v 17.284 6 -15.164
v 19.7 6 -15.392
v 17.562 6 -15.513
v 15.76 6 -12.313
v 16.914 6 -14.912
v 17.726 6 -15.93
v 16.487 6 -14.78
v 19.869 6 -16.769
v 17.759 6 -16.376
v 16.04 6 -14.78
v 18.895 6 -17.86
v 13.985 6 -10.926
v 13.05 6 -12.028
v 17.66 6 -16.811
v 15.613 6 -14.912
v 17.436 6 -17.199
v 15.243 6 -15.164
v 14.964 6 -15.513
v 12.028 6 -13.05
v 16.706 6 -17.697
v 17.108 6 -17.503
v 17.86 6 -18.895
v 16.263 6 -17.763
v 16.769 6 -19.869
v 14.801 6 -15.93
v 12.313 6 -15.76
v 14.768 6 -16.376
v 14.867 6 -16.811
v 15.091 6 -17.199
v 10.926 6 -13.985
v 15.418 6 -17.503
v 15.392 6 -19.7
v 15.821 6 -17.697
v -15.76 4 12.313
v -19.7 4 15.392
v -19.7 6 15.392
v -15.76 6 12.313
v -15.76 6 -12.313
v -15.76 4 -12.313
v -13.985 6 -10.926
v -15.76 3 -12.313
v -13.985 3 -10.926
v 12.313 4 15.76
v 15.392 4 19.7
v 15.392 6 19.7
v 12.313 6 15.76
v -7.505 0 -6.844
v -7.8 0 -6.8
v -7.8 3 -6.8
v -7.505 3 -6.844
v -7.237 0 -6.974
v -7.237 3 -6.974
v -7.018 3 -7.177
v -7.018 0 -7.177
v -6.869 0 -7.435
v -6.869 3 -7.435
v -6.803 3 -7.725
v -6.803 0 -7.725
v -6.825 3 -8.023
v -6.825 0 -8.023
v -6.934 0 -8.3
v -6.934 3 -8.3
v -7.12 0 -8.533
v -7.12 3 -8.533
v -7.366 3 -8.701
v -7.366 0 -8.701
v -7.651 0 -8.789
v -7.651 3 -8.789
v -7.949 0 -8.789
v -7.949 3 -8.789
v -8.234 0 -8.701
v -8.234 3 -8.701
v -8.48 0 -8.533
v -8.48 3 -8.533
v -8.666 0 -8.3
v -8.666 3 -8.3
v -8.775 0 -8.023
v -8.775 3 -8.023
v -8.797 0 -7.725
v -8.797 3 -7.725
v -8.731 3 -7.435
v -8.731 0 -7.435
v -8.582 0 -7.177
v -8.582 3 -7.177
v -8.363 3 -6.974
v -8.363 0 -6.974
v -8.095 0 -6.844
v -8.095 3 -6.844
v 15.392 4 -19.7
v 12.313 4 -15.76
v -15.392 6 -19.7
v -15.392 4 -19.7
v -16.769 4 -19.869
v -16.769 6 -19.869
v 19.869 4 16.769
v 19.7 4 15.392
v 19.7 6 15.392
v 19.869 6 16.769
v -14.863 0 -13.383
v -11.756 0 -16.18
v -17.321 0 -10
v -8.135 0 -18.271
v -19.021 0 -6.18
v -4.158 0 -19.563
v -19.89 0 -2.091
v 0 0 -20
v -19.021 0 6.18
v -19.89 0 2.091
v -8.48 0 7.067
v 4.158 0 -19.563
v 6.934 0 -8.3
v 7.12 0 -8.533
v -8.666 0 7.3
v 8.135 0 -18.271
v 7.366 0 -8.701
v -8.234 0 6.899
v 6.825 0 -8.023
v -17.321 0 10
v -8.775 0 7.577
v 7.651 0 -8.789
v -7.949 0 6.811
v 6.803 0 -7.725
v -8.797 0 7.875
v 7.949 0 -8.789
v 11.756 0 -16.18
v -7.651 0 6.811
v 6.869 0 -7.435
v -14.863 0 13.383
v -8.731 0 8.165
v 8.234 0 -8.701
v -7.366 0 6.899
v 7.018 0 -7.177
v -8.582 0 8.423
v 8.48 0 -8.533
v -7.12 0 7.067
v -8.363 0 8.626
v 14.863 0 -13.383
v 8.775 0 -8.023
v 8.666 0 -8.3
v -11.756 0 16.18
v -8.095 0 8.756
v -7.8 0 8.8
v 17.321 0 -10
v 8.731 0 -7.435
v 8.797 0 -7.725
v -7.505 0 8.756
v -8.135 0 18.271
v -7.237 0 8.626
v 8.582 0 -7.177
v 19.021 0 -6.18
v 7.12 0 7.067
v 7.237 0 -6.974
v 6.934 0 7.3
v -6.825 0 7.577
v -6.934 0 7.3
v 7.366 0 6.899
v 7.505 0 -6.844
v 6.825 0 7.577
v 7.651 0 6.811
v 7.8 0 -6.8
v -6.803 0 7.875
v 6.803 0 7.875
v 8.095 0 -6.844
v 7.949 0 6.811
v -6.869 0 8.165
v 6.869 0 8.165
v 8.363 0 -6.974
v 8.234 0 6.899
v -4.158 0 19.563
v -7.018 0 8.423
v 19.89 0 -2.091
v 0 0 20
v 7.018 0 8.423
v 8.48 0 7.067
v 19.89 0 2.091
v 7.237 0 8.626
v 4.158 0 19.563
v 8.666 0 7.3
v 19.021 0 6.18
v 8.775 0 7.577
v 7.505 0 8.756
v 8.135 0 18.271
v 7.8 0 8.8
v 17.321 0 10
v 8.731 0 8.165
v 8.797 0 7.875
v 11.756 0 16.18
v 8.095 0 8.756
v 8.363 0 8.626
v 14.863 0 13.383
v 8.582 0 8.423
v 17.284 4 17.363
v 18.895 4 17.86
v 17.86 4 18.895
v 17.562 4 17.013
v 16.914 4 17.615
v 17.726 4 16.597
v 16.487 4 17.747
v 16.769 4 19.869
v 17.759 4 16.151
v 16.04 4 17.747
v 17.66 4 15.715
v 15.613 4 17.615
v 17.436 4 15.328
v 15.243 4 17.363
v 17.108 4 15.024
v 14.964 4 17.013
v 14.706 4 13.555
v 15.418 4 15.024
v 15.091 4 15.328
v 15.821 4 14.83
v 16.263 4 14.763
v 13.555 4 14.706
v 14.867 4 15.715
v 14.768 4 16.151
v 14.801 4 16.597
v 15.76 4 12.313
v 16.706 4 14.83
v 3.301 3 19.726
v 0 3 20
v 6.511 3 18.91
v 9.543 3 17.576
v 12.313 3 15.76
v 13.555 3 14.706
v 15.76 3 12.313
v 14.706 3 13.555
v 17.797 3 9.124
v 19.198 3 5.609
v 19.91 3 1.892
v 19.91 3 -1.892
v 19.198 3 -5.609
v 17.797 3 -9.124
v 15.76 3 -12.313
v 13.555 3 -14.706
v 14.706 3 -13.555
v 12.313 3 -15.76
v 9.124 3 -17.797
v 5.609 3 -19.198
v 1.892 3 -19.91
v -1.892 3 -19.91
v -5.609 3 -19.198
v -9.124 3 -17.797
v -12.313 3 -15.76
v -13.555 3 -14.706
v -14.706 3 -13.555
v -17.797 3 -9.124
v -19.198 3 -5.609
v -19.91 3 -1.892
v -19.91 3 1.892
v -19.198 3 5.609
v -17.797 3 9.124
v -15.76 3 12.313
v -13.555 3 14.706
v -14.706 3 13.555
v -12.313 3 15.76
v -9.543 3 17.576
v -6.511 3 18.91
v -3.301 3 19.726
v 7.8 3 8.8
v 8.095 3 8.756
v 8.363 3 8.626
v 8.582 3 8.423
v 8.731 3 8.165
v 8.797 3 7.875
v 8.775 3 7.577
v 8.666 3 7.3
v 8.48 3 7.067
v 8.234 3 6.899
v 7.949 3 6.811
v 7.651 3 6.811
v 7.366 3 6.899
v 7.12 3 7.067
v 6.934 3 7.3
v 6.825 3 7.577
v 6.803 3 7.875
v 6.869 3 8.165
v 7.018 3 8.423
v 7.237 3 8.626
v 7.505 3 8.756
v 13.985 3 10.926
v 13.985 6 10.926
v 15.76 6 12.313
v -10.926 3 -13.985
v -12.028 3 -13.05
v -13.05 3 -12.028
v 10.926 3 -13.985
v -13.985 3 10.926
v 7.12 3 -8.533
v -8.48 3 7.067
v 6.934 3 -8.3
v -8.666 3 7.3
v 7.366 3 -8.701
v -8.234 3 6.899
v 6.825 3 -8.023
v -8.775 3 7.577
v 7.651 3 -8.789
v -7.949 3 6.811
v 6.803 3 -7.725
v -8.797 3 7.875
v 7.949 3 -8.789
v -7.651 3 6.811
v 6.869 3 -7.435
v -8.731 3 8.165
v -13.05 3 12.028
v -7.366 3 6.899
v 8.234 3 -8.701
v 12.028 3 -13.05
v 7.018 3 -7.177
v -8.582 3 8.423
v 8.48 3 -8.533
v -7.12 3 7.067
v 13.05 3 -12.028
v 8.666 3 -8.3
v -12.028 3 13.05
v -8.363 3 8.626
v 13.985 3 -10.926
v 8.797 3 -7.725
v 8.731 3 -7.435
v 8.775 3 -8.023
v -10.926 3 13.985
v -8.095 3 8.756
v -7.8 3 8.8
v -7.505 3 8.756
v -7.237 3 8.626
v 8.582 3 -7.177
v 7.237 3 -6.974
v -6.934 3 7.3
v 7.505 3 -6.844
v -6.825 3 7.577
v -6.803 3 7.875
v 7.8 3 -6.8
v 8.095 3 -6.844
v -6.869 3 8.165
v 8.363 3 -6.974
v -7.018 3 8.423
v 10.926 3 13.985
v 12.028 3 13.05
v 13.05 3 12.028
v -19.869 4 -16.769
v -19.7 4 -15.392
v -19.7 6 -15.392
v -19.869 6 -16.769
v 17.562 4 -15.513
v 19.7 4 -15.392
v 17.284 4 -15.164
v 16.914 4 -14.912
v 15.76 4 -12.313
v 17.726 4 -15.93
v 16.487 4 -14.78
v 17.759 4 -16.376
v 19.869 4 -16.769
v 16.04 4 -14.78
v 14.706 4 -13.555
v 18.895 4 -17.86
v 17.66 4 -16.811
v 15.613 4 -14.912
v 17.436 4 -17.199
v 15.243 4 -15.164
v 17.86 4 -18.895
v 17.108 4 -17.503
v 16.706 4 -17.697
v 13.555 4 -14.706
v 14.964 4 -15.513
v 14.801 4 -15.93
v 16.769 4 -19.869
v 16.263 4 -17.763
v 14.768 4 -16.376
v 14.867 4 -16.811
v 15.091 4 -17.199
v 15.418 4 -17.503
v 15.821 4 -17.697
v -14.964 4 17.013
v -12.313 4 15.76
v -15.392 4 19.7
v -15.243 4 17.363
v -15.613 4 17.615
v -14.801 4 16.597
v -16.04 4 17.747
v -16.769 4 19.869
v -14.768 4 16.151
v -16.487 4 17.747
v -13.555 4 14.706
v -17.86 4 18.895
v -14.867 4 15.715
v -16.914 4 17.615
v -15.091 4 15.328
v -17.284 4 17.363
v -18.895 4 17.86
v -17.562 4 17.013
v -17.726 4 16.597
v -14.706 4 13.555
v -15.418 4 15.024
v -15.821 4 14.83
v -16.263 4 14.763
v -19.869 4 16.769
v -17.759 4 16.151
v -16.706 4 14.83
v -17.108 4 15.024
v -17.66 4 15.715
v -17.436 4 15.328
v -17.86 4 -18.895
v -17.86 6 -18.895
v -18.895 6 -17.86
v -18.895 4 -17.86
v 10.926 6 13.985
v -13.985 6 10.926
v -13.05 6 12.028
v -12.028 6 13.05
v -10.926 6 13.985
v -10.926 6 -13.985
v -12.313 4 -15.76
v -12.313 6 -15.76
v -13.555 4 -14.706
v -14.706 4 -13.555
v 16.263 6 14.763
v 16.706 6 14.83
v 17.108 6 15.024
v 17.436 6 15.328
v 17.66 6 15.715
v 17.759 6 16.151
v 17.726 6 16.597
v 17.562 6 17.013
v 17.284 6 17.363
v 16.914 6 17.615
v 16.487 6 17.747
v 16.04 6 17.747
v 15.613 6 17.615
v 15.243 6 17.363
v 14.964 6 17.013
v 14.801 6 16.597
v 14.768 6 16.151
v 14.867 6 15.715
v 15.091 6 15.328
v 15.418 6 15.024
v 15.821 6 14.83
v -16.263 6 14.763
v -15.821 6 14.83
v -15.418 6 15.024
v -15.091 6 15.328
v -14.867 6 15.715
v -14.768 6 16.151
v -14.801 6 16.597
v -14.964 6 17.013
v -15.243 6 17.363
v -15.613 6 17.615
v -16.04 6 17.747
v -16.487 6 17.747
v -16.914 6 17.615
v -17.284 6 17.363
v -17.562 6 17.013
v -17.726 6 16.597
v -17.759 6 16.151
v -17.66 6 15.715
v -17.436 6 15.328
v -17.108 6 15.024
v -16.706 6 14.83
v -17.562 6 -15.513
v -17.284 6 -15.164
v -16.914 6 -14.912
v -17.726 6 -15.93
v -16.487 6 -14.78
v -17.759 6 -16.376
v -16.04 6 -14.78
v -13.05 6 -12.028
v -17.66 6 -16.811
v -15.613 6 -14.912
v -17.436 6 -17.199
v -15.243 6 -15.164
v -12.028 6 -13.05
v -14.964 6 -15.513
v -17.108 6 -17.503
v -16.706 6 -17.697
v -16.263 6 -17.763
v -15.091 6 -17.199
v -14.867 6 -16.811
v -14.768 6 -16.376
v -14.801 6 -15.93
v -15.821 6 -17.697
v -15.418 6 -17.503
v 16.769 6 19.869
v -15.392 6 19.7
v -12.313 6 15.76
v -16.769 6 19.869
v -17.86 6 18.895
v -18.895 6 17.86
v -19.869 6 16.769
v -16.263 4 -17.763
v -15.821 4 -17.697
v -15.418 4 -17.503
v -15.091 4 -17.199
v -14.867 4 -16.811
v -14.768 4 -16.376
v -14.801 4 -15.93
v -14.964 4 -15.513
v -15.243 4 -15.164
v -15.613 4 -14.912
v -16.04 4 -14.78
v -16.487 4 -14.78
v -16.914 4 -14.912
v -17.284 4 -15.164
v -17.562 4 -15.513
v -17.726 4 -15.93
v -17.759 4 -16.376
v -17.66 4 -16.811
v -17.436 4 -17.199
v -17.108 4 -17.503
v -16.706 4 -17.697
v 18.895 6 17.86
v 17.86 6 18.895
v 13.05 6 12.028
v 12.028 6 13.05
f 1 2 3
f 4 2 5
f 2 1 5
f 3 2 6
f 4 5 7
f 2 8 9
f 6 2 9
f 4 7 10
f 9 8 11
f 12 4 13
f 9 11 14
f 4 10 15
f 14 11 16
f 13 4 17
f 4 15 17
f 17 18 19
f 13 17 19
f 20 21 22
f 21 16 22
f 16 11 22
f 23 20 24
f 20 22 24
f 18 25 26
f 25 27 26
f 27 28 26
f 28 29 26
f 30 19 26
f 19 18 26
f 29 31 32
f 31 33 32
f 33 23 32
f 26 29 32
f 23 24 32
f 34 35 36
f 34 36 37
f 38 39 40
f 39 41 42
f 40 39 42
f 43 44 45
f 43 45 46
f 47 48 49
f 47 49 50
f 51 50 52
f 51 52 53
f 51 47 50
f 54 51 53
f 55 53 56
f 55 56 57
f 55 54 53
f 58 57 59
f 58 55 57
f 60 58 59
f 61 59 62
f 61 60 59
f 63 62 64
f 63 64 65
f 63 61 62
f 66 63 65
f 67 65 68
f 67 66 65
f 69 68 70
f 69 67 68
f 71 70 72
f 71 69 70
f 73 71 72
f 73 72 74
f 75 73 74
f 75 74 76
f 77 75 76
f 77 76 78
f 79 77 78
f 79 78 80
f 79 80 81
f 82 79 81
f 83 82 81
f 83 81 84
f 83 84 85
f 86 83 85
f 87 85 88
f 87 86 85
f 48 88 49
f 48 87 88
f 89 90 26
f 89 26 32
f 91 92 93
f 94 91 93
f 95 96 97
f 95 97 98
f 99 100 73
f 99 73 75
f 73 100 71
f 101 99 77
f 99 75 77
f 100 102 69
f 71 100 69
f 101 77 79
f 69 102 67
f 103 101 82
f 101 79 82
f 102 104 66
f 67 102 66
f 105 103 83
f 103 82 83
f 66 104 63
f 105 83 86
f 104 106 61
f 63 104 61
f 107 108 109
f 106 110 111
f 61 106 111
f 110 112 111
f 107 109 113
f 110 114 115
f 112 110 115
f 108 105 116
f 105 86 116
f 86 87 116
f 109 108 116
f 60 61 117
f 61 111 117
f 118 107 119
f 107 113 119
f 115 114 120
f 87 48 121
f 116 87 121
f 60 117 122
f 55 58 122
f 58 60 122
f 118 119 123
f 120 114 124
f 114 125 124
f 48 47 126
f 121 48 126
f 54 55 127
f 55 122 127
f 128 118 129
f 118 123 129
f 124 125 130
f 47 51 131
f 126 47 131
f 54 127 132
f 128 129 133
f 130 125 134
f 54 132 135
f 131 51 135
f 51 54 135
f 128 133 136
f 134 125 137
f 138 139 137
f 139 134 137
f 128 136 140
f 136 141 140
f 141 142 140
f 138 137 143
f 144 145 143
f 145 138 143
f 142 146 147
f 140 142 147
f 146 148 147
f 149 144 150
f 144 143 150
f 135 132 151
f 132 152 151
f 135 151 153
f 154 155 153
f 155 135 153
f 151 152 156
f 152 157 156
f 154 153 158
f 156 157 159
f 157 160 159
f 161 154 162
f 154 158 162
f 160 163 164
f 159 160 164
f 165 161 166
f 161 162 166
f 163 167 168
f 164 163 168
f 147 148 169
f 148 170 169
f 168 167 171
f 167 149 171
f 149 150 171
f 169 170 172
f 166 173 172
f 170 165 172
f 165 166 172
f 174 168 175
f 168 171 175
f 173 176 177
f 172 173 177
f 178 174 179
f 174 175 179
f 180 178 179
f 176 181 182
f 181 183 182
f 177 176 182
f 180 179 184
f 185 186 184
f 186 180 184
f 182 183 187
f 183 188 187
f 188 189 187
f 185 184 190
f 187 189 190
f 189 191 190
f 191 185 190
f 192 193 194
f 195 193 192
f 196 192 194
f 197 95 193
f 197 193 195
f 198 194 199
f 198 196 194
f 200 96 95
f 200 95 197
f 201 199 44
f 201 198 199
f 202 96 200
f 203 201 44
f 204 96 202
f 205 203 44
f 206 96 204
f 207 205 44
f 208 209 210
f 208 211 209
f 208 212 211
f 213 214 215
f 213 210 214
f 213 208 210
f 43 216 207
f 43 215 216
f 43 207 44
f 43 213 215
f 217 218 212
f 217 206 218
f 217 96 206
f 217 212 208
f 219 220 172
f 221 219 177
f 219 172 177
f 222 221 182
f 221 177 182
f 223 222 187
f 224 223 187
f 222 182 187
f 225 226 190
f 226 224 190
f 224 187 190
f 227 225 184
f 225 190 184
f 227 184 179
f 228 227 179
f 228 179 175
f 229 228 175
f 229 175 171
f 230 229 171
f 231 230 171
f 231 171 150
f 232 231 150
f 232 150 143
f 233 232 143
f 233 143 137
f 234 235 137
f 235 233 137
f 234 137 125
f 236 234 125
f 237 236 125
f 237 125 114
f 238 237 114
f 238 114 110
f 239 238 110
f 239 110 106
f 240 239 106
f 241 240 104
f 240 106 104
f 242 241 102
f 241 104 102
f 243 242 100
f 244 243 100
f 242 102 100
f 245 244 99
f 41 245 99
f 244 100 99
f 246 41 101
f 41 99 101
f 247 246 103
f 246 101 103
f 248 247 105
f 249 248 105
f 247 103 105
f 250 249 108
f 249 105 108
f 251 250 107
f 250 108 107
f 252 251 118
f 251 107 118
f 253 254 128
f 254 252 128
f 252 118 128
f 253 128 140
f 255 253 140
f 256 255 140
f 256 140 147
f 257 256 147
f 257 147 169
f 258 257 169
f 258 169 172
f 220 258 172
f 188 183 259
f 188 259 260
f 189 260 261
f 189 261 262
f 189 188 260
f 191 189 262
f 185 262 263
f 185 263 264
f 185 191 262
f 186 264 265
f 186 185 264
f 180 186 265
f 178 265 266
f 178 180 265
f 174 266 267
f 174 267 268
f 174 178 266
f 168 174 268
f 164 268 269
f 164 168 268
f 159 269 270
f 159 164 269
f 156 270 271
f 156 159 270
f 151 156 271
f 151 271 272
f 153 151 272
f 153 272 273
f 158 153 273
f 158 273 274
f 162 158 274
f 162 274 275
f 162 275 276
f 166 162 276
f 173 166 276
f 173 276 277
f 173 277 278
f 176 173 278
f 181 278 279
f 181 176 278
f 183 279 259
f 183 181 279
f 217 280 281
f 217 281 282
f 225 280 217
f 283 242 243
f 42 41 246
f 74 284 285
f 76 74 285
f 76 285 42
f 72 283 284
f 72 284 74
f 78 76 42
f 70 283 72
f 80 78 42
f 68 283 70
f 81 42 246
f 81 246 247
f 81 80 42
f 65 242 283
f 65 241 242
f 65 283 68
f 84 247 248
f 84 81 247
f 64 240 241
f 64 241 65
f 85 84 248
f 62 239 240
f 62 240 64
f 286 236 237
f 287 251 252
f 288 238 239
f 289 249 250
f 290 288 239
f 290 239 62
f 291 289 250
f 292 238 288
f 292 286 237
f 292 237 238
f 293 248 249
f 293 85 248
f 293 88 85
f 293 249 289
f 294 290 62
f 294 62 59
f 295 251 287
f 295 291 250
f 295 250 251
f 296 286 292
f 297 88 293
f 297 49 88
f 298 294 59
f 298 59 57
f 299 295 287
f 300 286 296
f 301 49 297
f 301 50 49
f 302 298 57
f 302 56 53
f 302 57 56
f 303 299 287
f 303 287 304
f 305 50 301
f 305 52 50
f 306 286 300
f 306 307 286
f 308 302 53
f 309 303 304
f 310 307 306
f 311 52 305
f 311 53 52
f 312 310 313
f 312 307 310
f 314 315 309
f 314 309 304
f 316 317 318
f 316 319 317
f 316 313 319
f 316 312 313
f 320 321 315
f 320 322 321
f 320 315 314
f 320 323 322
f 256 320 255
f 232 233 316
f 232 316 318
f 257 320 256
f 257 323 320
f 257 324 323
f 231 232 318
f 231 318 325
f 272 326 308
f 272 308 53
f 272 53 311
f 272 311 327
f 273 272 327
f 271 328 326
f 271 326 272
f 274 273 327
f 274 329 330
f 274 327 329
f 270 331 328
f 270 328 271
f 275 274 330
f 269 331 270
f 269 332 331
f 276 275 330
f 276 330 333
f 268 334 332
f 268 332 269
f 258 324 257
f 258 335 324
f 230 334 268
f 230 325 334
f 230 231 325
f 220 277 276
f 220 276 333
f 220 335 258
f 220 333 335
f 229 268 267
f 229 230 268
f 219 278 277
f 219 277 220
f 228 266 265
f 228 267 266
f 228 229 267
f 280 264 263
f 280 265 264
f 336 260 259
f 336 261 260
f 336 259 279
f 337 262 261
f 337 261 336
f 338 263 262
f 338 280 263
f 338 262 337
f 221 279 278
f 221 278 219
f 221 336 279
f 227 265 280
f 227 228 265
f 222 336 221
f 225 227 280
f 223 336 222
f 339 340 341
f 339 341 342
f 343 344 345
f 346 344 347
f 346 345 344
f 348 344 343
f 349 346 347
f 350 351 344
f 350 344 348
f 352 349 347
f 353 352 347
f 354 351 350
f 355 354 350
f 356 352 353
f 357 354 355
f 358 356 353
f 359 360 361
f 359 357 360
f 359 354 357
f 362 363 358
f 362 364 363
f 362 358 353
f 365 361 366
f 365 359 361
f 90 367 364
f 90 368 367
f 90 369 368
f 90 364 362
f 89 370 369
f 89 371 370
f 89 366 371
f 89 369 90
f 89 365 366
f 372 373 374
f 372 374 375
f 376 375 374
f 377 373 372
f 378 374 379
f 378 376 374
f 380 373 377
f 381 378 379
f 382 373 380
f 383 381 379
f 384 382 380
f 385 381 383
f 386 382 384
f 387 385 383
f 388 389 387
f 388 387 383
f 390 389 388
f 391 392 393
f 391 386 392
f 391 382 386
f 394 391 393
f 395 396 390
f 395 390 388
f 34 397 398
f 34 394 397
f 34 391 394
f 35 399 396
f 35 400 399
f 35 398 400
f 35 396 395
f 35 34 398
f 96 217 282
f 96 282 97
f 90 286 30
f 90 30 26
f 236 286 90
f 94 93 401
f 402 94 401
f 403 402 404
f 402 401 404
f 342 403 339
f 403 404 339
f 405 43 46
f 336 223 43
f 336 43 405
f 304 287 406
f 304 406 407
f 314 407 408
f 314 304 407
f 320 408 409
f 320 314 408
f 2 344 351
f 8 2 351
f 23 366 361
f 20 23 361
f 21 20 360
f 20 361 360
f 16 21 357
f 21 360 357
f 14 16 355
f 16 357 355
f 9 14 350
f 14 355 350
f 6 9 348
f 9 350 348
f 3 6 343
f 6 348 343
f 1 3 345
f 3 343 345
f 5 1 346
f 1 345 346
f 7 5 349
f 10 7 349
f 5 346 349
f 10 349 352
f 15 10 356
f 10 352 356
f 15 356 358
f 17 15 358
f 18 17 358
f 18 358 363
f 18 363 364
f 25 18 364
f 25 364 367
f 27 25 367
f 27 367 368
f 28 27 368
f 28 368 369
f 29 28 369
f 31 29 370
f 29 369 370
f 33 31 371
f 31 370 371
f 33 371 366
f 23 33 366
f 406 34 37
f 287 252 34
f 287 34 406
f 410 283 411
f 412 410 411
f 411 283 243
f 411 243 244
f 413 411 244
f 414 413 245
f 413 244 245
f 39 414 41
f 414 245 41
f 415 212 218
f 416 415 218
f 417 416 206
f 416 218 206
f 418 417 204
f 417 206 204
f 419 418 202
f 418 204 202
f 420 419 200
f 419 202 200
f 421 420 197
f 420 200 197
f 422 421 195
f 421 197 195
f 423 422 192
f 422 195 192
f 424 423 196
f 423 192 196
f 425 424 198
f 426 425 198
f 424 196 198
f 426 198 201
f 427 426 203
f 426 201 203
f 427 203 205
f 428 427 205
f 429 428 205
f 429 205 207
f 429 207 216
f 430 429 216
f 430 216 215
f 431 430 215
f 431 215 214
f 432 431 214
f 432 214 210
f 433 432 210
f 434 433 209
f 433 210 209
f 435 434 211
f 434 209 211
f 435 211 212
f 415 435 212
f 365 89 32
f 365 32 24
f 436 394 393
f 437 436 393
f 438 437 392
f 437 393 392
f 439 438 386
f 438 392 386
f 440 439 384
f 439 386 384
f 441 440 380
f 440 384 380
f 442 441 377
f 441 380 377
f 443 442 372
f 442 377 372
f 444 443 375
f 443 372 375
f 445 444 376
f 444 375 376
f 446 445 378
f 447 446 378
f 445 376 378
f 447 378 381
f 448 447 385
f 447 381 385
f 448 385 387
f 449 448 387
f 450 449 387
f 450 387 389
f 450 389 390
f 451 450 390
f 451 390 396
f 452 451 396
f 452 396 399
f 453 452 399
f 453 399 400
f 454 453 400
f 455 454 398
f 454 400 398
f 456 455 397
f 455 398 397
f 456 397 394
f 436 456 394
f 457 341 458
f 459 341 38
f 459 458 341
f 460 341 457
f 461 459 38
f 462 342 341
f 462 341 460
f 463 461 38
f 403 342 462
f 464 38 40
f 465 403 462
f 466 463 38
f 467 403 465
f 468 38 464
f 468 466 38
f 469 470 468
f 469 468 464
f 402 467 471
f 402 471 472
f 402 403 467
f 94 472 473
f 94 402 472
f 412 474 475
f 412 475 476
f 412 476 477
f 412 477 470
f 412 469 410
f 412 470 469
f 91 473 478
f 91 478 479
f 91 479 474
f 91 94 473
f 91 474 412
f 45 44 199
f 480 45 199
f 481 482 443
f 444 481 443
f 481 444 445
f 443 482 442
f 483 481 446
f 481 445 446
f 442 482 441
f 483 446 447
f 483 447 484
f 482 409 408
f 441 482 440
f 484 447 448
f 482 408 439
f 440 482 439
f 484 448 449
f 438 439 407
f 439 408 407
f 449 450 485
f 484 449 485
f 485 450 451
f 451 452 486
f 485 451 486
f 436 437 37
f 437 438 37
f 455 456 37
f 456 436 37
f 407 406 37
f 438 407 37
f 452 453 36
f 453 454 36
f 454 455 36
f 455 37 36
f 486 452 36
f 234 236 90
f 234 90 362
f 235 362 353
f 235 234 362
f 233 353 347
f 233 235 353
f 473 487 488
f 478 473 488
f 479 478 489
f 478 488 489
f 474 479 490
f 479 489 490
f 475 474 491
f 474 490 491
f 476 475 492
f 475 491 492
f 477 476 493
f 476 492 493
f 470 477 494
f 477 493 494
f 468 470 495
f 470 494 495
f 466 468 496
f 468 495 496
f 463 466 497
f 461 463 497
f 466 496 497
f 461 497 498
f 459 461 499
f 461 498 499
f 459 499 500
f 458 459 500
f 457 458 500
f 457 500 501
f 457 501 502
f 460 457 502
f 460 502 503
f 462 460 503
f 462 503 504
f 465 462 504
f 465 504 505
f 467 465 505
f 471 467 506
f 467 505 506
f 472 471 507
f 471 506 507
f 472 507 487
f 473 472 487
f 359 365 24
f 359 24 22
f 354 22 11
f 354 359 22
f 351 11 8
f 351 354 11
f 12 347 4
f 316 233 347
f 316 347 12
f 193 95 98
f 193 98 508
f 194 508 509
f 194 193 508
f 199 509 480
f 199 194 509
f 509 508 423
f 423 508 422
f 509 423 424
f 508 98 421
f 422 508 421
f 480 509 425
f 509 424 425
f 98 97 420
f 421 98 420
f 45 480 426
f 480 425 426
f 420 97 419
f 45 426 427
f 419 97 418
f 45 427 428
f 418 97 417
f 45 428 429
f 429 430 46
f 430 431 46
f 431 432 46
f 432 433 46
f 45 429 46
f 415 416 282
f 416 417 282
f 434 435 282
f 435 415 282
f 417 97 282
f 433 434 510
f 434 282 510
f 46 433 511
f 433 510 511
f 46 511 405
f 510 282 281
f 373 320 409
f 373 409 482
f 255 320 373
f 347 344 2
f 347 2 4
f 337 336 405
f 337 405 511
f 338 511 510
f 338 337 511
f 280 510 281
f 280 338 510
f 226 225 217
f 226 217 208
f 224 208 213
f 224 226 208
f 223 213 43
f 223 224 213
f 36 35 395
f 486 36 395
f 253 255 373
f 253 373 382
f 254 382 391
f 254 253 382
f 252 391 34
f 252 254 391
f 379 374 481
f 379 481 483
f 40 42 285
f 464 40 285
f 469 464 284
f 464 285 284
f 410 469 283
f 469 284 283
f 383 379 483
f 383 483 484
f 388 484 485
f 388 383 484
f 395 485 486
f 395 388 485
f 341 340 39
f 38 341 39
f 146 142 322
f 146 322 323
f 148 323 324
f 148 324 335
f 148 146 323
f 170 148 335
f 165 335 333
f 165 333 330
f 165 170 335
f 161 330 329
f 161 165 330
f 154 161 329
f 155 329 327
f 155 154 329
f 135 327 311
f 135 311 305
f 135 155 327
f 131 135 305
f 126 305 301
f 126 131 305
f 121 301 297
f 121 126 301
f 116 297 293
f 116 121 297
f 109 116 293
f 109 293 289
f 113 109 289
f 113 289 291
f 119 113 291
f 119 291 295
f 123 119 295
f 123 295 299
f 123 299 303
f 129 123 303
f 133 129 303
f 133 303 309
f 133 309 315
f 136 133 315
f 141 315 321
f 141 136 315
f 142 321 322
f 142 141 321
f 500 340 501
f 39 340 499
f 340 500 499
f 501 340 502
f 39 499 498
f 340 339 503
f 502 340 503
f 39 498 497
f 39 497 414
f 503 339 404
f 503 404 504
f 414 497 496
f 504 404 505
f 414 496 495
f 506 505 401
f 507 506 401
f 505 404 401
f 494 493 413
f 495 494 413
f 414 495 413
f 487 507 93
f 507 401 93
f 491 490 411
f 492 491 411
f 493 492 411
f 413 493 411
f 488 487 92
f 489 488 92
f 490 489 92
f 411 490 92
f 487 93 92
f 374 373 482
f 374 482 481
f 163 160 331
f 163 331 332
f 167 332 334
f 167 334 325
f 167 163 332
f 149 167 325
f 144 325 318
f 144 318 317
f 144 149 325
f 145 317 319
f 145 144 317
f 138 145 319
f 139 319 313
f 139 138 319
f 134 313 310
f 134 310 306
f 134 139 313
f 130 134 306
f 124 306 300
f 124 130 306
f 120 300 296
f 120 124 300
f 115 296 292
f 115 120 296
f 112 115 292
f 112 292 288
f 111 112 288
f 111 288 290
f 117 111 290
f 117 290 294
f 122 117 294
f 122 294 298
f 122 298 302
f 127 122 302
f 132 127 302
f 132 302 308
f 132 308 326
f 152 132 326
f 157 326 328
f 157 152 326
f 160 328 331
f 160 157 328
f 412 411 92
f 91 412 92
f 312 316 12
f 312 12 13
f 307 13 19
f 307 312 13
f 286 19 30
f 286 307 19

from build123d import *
from build123d.topology import SkipClean

# Parameters (mm, degrees)
SKETCH1_R           = 20
SKETCH1_R_2         = 1
BOSS_EXTRUDE1_DEPTH = 3
BOSS_EXTRUDE2_DEPTH = 3
BOSS_EXTRUDE3_START = -2
BOSS_EXTRUDE3_DEPTH = 2
SKETCH4_R           = 1.5
CUT_EXTRUDE1_DEPTH  = 2
CHAMFER2_SIZE       = 1


with BuildPart() as part:
    # Sketch1 → Boss-Extrude1 (new body)
    with BuildSketch(Plane(origin=(0, 0, 0), x_dir=(1, 0, 0), z_dir=(0, 1, 0))):
        with Locations(Location((0, 0, 0), (0, 0, 270))):
            Circle(SKETCH1_R)
        with Locations(Location((-7.8, 7.8, 0), (0, 0, 270))):
            Circle(SKETCH1_R_2, mode=Mode.SUBTRACT)
        with Locations(Location((7.8, 7.8, 0), (0, 0, 270))):
            Circle(SKETCH1_R_2, mode=Mode.SUBTRACT)
        with Locations(Location((7.8, -7.8, 0), (0, 0, 270))):
            Circle(SKETCH1_R_2, mode=Mode.SUBTRACT)
        with Locations(Location((-7.8, -7.8, 0), (0, 0, 270))):
            Circle(SKETCH1_R_2, mode=Mode.SUBTRACT)
    extrude(amount=BOSS_EXTRUDE1_DEPTH)

    # Sketch2 → Boss-Extrude2 (add)
    with SkipClean():  # the faces are left unmerged after this step: merging them gives an invalid solid
        with BuildSketch(Plane(origin=(0, 3, 0), x_dir=(1, 0, 0), z_dir=(0, 1, 0))):
            with BuildLine():
                Line((-10.926328273, 13.985062443), (-12.313229507, 15.760215072))
                ThreePointArc((-12.313229507, 15.760215072), (-14.142135624, 14.142135624), (-15.760215072, 12.313229507))
                Line((-15.760215072, 12.313229507), (-13.985062443, 10.926328273))
                ThreePointArc((-13.985062443, 10.926328273), (-12.549235456, 12.549235456), (-10.926328273, 13.985062443))
            make_face()
            with BuildLine():
                Line((10.926328273, 13.985062443), (12.313229507, 15.760215072))
                ThreePointArc((12.313229507, 15.760215072), (14.142135624, 14.142135624), (15.760215072, 12.313229507))
                Line((15.760215072, 12.313229507), (13.985062443, 10.926328273))
                ThreePointArc((13.985062443, 10.926328273), (12.549235456, 12.549235456), (10.926328273, 13.985062443))
            make_face()
            with BuildLine():
                Line((13.985062443, -10.926328273), (15.760215072, -12.313229507))
                ThreePointArc((15.760215072, -12.313229507), (14.142135624, -14.142135624), (12.313229507, -15.760215072))
                Line((12.313229507, -15.760215072), (10.926328273, -13.985062443))
                ThreePointArc((10.926328273, -13.985062443), (12.549235456, -12.549235456), (13.985062443, -10.926328273))
            make_face()
            with BuildLine():
                Line((-10.926328273, -13.985062443), (-12.313229507, -15.760215072))
                ThreePointArc((-12.313229507, -15.760215072), (-14.142135624, -14.142135624), (-15.760215072, -12.313229507))
                Line((-15.760215072, -12.313229507), (-13.985062443, -10.926328273))
                ThreePointArc((-13.985062443, -10.926328273), (-12.549235456, -12.549235456), (-10.926328273, -13.985062443))
            make_face()
        extrude(amount=BOSS_EXTRUDE2_DEPTH)

    # Sketch3 → Boss-Extrude3 (add)
    with SkipClean():  # the faces are left unmerged after this step: merging them gives an invalid solid
        with BuildSketch(Plane(origin=(0, 6, 0), x_dir=(1, 0, 0), z_dir=(0, 1, 0)).offset(BOSS_EXTRUDE3_START)):
            with BuildLine():
                Line((12.313229507, 15.760215072), (16.007198358, 20.488279594))
                ThreePointArc((16.007198358, 20.488279594), (18.384776311, 18.384776311), (20.488279594, 16.007198358))
                Line((20.488279594, 16.007198358), (15.760215072, 12.313229507))
                ThreePointArc((15.760215072, 12.313229507), (14.142135624, 14.142135624), (12.313229507, 15.760215072))
            make_face()
            with BuildLine():
                Line((-12.313229507, 15.760215072), (-16.007198358, 20.488279594))
                ThreePointArc((-16.007198358, 20.488279594), (-18.384776311, 18.384776311), (-20.488279594, 16.007198358))
                Line((-20.488279594, 16.007198358), (-15.760215072, 12.313229507))
                ThreePointArc((-15.760215072, 12.313229507), (-14.142135624, 14.142135624), (-12.313229507, 15.760215072))
            make_face()
            with BuildLine():
                Line((15.760215072, -12.313229507), (20.488279594, -16.007198358))
                ThreePointArc((20.488279594, -16.007198358), (18.384776311, -18.384776311), (16.007198358, -20.488279594))
                Line((16.007198358, -20.488279594), (12.313229507, -15.760215072))
                ThreePointArc((12.313229507, -15.760215072), (14.142135624, -14.142135624), (15.760215072, -12.313229507))
            make_face()
            with BuildLine():
                Line((-12.313229507, -15.760215072), (-16.007198358, -20.488279594))
                ThreePointArc((-16.007198358, -20.488279594), (-18.384776311, -18.384776311), (-20.488279594, -16.007198358))
                Line((-20.488279594, -16.007198358), (-15.760215072, -12.313229507))
                ThreePointArc((-15.760215072, -12.313229507), (-14.142135624, -14.142135624), (-12.313229507, -15.760215072))
            make_face()
        extrude(amount=BOSS_EXTRUDE3_DEPTH)

    # Sketch4 → Cut-Extrude1 (cut)
    with SkipClean():  # the faces are left unmerged after this step: merging them gives an invalid solid
        with BuildSketch(Plane.XZ.offset(-4)):
            with Locations(Location((-16.263455967, -16.263455967, 0), (0, 0, 270))):
                Circle(SKETCH4_R)
            with Locations(Location((-16.263455967, 16.263455967, 0), (0, 0, 270))):
                Circle(SKETCH4_R)
            with Locations(Location((16.263455967, 16.263455967, 0), (0, 0, 270))):
                Circle(SKETCH4_R)
            with Locations(Location((16.263455967, -16.263455967, 0), (0, 0, 270))):
                Circle(SKETCH4_R)
        extrude(amount=-CUT_EXTRUDE1_DEPTH, mode=Mode.SUBTRACT)

    # Chamfer2
    # the kernel refuses this chamfer: 1 mm, written as the material it takes off along each edge
    with BuildSketch(Plane(origin=(-16.007198358, 1.428317012, 20.488279594), x_dir=(0.615661475325629, 0, -0.788010753606745), z_dir=(0, 1, 0)), Plane(origin=(20.488279594, 1.428317012, 16.007198358), x_dir=(-0.7880107536067236, 0, -0.6156614753256563), z_dir=(0, 1, 0)), Plane(origin=(16.007198358, 1.428317012, -20.488279594), x_dir=(-0.6156614753256462, 0, 0.7880107536067315), z_dir=(0, 1, 0)), Plane(origin=(-20.488279594, 1.428317012, -16.007198358), x_dir=(0.7880107536067239, 0, 0.6156614753256557), z_dir=(0, 1, 0))) as chamfer2_piece_1:
        with BuildLine():
            Line((CHAMFER2_SIZE, 0), (0.018531237, 0.981468763))
            ThreePointArc((0.018531237, 0.981468763), (0.004898706, 0.504686734), (0, 0))
            Line((0, 0), (CHAMFER2_SIZE, 0))
        make_face()
    extrude(amount=7.143365976, mode=Mode.SUBTRACT)
    with BuildSketch(Plane(origin=(-20.488279594, 1.428317012, 16.007198358), x_dir=(0.7880107536066959, 0, -0.6156614753256917), z_dir=(0, 1, 0)), Plane(origin=(16.007198358, 1.428317012, 20.488279594), x_dir=(-0.6156614753256615, 0, -0.7880107536067196), z_dir=(0, 1, 0)), Plane(origin=(20.488279594, 1.428317012, -16.007198358), x_dir=(-0.7880107536067122, 0, 0.615661475325671), z_dir=(0, 1, 0)), Plane(origin=(-16.007198358, 1.428317012, -20.488279594), x_dir=(0.615661475325662, 0, 0.7880107536067191), z_dir=(0, 1, 0))) as chamfer2_piece_2:
        with BuildLine():
            Line((CHAMFER2_SIZE, 0), (0.018531237, -0.981468763))
            ThreePointArc((0.018531237, -0.981468763), (0.004898706, -0.504686734), (0, 0))
            Line((0, 0), (CHAMFER2_SIZE, 0))
        make_face()
    extrude(amount=7.143365976, mode=Mode.SUBTRACT)


solid = part.part
